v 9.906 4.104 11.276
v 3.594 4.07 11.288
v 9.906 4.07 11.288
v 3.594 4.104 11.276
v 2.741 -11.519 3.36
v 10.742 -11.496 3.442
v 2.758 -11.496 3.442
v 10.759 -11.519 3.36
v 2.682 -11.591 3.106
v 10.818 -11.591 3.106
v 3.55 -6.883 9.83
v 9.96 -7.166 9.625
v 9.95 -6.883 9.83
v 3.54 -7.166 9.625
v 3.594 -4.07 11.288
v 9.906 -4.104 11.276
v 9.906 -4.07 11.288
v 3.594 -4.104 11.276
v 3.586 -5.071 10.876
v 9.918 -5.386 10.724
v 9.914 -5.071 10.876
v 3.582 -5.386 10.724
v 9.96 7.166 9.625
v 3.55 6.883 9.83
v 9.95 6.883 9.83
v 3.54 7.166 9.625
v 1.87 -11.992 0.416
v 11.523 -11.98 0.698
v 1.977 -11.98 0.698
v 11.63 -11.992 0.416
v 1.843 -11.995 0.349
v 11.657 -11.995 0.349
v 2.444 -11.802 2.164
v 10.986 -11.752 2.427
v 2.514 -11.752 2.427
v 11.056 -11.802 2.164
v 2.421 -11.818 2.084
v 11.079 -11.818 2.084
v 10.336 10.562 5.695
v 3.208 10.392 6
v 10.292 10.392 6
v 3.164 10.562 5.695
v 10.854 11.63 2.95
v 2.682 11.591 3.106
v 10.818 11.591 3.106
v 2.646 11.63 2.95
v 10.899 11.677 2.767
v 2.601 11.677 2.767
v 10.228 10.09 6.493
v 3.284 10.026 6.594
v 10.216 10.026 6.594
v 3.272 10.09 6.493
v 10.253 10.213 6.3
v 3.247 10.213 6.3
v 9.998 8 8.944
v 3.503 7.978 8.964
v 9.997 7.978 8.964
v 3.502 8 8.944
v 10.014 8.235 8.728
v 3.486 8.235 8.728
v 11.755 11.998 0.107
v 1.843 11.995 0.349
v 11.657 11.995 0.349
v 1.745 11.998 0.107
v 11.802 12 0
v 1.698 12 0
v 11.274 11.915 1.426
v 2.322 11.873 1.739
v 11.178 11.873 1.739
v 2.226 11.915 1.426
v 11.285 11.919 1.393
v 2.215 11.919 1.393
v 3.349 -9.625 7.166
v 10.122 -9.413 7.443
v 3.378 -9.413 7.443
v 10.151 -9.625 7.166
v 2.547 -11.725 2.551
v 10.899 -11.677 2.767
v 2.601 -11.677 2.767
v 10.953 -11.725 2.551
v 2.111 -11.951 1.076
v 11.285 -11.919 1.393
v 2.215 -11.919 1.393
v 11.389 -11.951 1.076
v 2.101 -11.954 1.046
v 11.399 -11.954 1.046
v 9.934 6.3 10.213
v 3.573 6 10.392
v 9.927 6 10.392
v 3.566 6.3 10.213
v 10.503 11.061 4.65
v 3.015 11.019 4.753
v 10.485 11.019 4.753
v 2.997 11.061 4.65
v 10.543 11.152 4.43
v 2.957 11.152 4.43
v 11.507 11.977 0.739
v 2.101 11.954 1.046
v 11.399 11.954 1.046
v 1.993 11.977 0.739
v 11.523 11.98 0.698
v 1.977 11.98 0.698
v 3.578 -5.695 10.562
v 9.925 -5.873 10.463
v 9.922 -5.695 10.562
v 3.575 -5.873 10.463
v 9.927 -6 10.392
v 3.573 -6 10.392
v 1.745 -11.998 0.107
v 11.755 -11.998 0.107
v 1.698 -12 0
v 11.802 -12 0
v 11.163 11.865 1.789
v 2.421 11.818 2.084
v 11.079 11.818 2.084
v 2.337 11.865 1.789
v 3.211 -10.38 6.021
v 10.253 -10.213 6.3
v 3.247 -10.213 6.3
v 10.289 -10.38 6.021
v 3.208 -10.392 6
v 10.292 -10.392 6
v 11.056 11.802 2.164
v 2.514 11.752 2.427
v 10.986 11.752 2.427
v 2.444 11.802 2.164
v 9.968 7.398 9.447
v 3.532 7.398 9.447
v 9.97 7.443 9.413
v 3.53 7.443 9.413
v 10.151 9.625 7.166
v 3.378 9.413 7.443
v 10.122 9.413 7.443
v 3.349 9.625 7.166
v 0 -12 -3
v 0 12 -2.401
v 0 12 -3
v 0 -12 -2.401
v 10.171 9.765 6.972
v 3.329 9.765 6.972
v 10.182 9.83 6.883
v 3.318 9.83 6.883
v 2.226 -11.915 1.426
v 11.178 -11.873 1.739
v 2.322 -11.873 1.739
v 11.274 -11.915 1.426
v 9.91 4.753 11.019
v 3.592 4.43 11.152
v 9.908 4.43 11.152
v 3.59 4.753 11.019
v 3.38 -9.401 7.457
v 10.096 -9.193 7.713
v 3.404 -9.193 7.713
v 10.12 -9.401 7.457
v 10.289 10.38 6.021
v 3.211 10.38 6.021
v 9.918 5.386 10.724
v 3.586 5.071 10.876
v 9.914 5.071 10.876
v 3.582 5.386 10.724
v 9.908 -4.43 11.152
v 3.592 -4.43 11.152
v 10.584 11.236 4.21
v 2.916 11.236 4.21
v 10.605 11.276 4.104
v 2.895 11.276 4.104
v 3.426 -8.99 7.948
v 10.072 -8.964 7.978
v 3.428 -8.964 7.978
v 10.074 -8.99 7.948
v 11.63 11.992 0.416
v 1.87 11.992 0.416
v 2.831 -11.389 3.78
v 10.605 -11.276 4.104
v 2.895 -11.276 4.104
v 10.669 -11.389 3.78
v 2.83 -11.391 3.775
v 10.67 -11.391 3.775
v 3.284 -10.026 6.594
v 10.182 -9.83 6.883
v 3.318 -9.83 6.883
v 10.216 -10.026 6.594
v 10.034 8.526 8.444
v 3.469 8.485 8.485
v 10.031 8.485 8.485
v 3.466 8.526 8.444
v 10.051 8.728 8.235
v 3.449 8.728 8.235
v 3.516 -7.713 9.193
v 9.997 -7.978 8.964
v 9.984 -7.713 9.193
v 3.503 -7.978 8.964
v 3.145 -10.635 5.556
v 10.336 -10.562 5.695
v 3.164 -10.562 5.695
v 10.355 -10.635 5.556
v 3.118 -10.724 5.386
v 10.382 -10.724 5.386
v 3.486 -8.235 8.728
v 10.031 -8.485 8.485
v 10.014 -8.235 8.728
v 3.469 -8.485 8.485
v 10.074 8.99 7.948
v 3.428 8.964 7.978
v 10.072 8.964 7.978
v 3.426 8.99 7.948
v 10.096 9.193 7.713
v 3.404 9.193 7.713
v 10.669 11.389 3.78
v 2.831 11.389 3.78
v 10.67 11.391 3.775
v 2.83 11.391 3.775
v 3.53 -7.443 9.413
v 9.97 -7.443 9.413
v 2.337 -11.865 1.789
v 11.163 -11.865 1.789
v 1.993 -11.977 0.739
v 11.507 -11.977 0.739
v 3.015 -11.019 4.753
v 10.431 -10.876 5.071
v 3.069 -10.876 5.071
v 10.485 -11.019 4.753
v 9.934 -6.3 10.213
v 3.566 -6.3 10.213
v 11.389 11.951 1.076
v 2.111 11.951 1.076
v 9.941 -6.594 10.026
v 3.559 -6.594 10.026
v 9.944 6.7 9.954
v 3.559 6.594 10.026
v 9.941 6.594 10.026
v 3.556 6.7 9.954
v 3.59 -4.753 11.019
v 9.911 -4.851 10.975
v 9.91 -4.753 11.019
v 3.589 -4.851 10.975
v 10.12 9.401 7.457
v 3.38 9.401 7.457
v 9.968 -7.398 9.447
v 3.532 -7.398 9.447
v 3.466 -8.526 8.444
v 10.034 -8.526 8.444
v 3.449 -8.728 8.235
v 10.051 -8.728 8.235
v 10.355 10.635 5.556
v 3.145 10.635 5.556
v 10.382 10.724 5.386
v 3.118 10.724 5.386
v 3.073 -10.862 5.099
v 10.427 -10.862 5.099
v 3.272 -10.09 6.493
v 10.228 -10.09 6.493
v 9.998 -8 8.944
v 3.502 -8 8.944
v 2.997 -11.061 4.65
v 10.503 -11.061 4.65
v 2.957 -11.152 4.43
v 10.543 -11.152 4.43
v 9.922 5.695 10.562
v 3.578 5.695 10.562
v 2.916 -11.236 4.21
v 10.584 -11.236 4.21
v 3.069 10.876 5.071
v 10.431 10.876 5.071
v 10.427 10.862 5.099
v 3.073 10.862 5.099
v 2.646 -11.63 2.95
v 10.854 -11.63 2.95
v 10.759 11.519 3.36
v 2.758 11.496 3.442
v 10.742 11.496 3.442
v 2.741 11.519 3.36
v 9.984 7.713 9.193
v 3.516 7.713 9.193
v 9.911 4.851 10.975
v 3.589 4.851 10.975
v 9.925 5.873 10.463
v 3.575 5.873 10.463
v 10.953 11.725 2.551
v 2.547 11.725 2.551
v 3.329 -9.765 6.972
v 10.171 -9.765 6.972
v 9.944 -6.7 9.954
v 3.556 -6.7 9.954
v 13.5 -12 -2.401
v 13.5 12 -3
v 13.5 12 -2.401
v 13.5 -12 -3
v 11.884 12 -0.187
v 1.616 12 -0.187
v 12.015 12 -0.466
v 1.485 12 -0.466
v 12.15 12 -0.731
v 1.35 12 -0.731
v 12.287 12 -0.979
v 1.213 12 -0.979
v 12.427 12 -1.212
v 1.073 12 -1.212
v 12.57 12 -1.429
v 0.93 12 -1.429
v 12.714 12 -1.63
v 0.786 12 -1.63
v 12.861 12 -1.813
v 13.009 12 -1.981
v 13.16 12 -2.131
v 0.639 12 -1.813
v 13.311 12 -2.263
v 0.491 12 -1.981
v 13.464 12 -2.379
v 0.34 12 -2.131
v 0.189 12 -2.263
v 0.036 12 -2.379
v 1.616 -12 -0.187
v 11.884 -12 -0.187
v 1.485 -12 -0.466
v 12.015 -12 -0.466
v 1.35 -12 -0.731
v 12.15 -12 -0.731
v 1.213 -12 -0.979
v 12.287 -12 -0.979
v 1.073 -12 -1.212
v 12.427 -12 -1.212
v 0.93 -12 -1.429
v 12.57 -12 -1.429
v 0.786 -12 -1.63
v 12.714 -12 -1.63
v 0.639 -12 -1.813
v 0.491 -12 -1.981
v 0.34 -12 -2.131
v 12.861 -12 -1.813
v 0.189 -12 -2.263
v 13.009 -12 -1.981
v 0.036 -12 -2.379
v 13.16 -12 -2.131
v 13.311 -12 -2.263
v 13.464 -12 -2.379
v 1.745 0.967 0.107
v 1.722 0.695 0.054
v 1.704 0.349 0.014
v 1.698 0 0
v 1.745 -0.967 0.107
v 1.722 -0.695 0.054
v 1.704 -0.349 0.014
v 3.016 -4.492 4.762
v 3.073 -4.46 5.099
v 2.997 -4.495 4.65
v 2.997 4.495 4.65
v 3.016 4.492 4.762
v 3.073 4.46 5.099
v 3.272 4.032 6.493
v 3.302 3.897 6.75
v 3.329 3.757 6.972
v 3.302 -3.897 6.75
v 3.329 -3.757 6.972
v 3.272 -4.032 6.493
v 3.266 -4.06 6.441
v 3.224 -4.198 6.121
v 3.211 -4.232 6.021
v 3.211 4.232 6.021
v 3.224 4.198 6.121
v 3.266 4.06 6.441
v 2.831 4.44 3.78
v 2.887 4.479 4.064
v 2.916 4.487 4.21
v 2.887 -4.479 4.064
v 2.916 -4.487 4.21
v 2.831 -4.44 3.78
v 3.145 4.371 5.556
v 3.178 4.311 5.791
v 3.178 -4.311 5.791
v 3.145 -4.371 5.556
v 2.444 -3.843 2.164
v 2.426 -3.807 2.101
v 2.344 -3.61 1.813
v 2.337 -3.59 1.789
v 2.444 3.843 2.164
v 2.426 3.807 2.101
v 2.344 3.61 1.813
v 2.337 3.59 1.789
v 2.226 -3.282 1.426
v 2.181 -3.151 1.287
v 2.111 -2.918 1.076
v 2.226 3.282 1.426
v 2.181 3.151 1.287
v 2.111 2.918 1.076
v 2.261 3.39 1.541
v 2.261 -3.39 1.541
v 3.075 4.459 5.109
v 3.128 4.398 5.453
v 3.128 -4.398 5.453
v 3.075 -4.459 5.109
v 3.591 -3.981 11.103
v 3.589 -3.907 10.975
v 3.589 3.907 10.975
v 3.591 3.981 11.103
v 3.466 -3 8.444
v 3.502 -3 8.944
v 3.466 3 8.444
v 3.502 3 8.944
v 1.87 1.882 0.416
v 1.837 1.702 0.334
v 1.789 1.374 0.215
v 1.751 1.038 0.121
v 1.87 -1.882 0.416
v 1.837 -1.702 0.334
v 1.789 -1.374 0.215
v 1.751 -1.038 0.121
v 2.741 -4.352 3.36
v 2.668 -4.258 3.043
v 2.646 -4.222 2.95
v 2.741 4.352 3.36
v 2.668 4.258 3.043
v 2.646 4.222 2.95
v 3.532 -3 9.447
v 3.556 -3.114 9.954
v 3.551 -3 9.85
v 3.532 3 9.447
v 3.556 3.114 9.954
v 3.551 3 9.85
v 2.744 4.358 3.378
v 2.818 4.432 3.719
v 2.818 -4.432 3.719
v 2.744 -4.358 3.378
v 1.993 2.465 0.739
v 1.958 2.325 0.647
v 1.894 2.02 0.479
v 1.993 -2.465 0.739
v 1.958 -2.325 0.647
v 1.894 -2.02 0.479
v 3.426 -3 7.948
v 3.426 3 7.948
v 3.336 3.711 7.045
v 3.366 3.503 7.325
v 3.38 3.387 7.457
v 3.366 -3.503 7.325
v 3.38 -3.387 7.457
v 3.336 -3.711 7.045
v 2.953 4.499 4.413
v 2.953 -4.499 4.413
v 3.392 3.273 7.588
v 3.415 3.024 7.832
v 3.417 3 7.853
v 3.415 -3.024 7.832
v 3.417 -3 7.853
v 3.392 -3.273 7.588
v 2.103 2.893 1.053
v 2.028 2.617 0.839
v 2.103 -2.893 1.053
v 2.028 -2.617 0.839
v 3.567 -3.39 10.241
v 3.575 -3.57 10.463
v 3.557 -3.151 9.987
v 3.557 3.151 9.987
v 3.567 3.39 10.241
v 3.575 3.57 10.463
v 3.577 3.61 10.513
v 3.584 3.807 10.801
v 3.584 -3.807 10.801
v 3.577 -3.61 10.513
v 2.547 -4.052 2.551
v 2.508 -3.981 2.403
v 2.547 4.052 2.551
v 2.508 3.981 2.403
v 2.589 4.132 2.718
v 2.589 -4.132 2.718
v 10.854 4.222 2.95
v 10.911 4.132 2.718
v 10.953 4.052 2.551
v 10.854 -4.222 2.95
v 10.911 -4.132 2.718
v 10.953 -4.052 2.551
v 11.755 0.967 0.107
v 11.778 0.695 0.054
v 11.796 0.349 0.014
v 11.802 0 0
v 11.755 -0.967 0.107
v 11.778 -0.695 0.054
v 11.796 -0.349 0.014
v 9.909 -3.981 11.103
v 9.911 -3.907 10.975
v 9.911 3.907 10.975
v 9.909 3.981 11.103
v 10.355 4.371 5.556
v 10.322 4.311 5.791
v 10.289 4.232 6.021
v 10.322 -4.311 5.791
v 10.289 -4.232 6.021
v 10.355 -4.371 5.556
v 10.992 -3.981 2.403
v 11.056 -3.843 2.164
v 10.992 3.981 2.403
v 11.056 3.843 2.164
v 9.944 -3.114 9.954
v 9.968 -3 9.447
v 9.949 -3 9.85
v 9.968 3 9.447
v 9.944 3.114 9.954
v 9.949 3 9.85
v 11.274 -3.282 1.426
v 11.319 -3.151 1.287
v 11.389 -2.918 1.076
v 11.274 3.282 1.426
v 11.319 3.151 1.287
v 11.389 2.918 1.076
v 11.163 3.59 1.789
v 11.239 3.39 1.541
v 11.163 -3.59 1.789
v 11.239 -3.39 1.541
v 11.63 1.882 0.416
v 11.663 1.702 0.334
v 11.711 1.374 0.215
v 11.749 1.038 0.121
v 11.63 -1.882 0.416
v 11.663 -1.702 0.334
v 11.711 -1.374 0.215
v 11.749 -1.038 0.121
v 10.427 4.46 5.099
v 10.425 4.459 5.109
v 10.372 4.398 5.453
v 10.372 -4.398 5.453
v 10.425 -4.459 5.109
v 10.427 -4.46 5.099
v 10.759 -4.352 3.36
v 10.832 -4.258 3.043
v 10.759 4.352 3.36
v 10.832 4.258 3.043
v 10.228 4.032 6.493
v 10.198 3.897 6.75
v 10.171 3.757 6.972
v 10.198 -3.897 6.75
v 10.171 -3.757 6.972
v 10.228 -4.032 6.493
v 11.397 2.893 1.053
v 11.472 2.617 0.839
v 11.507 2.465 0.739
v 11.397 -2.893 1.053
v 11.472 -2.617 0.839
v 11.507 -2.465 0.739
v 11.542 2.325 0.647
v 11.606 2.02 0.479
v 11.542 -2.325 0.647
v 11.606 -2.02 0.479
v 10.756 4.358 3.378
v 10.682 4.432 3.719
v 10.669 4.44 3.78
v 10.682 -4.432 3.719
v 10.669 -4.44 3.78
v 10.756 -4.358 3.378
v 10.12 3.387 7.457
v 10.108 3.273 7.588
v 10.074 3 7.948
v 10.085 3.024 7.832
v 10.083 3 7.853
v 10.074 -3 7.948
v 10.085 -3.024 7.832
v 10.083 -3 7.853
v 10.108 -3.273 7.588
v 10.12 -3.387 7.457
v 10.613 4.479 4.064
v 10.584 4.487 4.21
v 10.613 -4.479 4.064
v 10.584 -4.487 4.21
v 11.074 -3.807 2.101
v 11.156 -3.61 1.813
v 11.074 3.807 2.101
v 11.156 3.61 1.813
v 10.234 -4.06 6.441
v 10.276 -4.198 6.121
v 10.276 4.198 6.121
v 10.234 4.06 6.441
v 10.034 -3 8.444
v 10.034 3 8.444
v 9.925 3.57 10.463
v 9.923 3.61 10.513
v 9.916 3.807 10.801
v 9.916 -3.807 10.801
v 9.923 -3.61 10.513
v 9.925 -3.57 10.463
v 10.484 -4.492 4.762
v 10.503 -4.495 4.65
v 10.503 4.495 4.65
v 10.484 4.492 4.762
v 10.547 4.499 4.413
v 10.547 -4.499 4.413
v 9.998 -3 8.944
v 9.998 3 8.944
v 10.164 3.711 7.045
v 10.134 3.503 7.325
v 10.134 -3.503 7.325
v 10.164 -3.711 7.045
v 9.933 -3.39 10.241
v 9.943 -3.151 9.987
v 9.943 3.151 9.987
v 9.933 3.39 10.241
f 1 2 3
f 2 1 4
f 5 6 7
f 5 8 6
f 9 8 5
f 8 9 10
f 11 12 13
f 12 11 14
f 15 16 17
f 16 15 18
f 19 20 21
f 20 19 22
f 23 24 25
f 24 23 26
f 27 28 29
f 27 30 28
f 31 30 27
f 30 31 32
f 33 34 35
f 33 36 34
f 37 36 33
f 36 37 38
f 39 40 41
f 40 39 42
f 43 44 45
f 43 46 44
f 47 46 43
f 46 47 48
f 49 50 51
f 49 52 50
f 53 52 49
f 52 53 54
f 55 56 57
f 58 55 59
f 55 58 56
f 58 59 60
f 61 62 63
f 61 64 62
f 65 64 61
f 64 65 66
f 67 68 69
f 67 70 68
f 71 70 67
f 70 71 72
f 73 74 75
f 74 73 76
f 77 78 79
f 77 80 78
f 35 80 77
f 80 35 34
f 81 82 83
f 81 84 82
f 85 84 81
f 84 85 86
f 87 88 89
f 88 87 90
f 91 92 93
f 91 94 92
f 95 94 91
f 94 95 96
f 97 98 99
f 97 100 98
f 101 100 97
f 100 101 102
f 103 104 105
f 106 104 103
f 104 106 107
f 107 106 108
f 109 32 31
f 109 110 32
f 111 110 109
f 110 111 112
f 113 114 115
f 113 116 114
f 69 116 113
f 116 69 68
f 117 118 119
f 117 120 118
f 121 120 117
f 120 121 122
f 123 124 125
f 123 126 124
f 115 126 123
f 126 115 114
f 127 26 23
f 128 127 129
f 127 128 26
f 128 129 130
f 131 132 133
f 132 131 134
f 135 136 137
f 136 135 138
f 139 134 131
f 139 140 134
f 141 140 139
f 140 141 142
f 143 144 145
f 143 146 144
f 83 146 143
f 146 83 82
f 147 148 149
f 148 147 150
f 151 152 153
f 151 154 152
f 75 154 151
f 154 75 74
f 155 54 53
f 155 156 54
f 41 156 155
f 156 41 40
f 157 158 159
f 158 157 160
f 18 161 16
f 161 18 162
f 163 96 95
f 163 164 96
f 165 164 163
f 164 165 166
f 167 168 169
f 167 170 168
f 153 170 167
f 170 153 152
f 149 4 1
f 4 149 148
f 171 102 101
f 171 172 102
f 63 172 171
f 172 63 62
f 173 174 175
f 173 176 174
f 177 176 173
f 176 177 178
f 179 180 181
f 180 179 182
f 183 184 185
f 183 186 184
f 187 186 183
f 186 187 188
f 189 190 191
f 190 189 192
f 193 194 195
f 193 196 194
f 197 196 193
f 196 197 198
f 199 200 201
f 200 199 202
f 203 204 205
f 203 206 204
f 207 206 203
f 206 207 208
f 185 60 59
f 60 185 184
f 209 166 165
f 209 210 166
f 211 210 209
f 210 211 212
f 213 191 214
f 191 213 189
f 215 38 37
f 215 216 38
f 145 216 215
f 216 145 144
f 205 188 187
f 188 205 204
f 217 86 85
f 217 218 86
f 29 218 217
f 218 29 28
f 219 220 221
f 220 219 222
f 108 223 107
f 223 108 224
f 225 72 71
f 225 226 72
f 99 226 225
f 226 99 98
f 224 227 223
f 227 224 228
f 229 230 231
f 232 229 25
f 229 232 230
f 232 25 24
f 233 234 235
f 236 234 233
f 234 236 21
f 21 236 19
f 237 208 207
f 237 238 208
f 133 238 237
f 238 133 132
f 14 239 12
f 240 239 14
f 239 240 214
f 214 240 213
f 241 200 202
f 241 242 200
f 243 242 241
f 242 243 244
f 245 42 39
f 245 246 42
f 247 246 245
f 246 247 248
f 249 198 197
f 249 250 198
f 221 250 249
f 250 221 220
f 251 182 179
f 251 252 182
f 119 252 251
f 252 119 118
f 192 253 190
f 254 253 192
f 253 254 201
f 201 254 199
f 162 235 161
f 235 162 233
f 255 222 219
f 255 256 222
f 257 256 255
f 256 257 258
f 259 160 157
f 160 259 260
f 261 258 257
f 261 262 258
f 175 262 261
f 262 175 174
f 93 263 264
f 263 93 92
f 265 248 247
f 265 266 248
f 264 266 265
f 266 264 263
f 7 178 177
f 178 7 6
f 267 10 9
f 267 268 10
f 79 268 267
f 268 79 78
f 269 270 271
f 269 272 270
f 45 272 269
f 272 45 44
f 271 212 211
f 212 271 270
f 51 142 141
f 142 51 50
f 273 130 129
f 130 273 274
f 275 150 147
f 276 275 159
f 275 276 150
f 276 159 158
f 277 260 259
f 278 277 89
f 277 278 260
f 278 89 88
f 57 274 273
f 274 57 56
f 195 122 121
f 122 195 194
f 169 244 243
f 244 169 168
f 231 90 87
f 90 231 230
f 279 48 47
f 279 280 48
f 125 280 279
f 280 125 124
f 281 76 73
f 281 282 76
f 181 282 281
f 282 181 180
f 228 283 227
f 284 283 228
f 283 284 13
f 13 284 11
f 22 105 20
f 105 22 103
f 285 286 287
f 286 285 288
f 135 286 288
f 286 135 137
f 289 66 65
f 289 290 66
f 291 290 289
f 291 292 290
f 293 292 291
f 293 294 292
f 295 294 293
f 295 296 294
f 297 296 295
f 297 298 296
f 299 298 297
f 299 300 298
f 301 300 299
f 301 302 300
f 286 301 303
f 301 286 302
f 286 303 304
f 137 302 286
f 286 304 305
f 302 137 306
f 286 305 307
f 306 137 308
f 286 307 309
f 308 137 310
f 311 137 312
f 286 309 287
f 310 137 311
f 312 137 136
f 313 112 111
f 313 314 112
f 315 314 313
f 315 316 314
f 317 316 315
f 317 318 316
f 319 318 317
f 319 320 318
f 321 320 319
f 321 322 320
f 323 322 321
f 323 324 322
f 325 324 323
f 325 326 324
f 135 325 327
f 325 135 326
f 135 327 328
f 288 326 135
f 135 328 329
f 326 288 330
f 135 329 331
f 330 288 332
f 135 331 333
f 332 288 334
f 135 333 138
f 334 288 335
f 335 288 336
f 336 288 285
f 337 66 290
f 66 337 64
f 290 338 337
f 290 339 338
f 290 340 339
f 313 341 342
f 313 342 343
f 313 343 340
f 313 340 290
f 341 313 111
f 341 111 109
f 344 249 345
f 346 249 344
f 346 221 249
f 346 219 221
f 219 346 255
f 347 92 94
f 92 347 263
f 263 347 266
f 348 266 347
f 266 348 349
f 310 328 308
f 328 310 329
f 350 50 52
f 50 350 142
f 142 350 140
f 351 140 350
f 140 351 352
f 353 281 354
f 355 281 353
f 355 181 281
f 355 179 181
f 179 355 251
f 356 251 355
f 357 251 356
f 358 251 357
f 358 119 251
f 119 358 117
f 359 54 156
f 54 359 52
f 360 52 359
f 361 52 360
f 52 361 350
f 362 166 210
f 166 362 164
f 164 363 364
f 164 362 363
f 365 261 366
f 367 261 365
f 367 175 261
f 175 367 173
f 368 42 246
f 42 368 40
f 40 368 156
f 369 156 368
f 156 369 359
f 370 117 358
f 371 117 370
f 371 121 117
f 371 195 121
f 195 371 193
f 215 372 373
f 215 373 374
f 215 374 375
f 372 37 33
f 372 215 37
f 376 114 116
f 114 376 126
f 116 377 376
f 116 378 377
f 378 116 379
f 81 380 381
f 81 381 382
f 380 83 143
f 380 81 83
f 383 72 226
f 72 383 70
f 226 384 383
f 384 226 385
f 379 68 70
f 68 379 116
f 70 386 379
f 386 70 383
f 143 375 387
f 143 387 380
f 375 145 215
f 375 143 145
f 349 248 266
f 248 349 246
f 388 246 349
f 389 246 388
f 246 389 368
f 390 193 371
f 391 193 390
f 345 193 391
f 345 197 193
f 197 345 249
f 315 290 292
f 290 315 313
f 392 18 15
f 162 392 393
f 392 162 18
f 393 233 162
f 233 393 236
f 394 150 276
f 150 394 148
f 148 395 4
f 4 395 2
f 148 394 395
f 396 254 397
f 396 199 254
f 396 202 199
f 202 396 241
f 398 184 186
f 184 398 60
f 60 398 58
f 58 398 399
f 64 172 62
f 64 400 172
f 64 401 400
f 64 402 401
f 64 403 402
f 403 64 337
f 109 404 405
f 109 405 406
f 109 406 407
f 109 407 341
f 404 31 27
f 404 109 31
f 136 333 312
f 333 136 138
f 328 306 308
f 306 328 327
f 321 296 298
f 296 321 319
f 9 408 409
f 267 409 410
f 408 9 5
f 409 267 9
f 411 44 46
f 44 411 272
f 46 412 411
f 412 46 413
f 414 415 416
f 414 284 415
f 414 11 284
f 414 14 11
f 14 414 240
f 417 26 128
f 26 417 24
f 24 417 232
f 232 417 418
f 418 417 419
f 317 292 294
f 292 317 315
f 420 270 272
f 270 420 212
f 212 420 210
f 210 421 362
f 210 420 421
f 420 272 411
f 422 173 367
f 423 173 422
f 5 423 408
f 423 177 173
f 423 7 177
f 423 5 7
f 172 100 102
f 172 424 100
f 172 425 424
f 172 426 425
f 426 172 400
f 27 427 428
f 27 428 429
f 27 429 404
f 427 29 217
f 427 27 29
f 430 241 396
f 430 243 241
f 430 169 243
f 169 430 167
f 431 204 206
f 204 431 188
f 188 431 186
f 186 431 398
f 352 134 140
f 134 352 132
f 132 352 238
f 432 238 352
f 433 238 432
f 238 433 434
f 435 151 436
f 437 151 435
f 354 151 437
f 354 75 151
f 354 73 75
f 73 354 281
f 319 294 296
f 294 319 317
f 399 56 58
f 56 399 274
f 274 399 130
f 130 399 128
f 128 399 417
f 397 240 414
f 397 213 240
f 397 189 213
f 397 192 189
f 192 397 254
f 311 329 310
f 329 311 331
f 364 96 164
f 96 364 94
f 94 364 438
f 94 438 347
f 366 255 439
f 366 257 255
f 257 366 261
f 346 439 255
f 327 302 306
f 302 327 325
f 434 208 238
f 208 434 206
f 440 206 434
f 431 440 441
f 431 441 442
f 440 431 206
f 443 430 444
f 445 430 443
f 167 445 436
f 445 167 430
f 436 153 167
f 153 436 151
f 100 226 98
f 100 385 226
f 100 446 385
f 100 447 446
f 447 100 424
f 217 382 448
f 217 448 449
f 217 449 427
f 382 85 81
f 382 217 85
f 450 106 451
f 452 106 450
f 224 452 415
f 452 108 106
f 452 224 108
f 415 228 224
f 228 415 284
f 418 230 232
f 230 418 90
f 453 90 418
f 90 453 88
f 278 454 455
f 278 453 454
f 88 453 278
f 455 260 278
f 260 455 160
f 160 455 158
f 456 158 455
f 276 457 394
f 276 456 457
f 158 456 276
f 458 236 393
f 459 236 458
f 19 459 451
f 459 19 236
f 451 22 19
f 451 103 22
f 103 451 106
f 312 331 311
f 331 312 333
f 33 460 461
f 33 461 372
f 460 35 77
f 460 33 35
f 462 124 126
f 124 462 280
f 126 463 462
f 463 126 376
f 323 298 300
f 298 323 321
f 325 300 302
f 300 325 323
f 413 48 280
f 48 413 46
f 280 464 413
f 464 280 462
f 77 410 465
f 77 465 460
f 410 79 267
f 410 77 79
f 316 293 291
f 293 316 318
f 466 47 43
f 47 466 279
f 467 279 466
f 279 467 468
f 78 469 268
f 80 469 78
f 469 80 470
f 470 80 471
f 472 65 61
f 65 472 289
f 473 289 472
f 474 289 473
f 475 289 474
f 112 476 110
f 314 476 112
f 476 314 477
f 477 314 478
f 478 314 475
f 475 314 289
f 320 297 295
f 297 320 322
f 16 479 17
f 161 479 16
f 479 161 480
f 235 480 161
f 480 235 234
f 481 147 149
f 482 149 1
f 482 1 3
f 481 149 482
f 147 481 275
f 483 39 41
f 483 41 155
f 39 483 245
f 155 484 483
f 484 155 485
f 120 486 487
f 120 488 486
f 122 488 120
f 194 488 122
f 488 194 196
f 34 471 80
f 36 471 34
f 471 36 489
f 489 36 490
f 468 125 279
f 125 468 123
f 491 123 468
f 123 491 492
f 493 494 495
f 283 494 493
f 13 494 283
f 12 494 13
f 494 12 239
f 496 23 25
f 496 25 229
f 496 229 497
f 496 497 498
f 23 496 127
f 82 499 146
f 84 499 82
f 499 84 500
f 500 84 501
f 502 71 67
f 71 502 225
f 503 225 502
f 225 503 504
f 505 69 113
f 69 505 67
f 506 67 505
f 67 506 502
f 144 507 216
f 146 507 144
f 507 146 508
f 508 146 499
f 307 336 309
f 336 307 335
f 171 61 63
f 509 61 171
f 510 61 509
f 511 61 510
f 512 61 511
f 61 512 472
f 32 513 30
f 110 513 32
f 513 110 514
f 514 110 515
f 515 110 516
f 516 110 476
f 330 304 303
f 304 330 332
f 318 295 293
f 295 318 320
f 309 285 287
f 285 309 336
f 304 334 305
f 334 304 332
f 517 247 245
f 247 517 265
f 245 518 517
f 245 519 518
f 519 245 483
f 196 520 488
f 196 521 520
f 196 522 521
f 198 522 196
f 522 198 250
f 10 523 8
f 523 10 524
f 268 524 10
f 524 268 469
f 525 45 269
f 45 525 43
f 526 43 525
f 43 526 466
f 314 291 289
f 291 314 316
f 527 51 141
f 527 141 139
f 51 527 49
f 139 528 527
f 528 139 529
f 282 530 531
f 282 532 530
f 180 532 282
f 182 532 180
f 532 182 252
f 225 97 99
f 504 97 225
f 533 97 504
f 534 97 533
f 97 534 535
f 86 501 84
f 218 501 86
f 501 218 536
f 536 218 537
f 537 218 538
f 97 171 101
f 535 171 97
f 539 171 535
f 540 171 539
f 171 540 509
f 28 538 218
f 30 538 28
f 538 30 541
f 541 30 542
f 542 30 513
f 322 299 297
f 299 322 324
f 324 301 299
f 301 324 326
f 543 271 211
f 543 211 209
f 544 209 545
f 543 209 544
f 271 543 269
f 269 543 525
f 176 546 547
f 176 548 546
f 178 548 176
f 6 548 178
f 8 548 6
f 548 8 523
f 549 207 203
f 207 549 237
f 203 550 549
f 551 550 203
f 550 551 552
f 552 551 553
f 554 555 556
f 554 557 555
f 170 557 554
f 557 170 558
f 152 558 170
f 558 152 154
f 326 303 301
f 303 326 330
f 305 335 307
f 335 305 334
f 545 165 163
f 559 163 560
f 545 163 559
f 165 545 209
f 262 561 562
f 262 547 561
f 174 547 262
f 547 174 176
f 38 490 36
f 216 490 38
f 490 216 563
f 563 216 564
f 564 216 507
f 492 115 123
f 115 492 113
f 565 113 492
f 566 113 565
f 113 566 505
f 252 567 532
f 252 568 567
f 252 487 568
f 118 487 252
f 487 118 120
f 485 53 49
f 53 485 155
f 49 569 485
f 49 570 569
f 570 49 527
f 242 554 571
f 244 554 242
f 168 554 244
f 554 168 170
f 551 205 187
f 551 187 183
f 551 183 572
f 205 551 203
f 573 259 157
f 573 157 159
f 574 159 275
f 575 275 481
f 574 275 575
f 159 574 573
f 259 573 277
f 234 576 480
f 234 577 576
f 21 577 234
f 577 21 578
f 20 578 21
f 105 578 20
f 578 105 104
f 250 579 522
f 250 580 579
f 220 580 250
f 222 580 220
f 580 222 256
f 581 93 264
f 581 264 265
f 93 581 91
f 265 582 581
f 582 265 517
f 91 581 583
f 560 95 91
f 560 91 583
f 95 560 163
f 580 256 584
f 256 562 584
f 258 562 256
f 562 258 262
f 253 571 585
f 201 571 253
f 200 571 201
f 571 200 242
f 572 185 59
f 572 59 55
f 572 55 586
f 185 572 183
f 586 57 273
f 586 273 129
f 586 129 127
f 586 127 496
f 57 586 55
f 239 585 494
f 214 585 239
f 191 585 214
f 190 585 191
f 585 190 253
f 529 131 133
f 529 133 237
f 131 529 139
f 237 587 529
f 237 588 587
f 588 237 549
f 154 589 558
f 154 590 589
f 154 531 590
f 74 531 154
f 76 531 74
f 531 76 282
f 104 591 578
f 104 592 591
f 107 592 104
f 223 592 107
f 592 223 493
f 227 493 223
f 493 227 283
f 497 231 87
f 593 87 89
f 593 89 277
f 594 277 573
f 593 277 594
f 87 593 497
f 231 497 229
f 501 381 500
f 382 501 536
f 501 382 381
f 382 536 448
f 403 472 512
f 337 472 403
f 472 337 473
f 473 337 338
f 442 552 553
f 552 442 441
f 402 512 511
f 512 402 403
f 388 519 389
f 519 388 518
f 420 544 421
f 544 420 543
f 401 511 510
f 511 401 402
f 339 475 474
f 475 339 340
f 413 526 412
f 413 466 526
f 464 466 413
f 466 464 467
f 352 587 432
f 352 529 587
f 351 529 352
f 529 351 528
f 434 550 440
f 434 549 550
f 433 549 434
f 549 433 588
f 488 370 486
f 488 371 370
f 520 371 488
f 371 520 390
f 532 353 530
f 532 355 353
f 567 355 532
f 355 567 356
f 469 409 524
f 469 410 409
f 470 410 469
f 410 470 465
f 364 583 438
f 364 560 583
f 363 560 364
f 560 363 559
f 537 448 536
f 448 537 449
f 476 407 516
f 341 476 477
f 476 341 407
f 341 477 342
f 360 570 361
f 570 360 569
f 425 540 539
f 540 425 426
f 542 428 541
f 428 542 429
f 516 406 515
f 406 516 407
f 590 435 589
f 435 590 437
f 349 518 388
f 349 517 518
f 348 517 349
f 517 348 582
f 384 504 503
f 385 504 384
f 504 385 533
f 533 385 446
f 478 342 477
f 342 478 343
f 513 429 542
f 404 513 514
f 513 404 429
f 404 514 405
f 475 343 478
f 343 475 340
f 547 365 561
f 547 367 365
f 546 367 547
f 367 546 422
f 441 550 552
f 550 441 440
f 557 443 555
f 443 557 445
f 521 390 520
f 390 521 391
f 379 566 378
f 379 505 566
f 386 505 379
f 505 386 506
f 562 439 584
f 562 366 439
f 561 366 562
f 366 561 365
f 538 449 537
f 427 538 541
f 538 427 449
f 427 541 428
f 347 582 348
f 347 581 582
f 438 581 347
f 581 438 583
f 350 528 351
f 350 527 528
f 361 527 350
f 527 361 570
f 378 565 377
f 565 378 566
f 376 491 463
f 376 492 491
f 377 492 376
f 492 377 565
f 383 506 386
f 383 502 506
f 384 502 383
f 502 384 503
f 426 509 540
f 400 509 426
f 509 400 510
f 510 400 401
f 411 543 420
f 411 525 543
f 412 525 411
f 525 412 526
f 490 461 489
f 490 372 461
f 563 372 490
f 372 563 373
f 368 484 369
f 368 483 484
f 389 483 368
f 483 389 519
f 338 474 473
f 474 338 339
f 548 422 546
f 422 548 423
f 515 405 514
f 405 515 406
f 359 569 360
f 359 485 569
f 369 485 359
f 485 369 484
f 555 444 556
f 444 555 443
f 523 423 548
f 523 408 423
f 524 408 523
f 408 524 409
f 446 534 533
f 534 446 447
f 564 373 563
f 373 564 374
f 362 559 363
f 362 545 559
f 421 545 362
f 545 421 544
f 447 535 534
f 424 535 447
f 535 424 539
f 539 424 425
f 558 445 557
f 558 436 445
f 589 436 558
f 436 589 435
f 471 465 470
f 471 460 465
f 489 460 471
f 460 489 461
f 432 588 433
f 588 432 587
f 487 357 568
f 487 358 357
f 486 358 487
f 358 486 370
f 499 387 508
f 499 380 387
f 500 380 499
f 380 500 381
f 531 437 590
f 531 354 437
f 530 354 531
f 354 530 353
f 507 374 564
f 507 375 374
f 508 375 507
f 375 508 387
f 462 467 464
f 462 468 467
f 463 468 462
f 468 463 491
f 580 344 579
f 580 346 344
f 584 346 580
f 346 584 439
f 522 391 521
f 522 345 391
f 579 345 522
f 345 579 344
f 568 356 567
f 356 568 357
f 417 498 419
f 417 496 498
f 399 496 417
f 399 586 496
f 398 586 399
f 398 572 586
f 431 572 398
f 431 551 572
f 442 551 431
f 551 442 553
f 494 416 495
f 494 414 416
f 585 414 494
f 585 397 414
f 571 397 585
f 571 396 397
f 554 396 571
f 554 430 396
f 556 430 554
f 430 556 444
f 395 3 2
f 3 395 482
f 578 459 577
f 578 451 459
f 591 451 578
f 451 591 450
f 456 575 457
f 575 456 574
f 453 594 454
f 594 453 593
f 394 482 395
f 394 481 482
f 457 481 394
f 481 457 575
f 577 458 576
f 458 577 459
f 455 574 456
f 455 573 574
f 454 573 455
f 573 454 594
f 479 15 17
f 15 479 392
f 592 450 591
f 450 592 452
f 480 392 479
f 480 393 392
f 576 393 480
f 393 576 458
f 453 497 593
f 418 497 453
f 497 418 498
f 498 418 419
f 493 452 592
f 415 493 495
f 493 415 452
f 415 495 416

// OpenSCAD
// it would be nice to bevel the deges, but we'll rely
// on build direction and skeinforge to do that for us
$fs=0.35;
$fa=1;

tol = 0.01;

basew = 25/2+1;  // wide enough for 1/2" double sided sticky tape with some slop

// ethernet
hole = 9;
gap = 6;

// power cable or video?
// hole = 12;
// gap = 7;

wall = 3;
basel = (hole + wall)*2;

sidecurveoff = wall*0.3;
sidecurvez = wall*0.9;
sidecurveh = basel/2+sidecurvez;
sidecurvew = basew/3;

difference() {
 union(){
  // base
  translate([0 , -basel/2, -wall])  cube([ basew, basel, wall ]);
  // body
  intersection() {
    rotate([0,90,0])
       cylinder(h=basew+tol*2, r=basel/2);
    translate([0,-basel/2, 0])
      cube([ basew, basel, basel/2]);
  }
 }
  // hole
  translate([-tol, 0, hole/2])
     rotate([0,90,0])
        cylinder(h=basew+tol*2, r=hole/2);
  // gap
  translate([-tol , -gap/2, hole/2-tol]) 
    cube([tol*2+basew, gap, tol*2+wall+hole/2]);
  // take a nick out of the top of the gap
  translate([-tol, 0, wall*1.4+hole])
    rotate([0,90,0])
       cylinder(h=basew+tol*2, r=gap/2+wall/2);
  // take some material off of the sides too
  translate([0,-basel/2-tol,sidecurveh-sidecurvez]) rotate([0,90,90]){   
    translate([0,sidecurveoff,0])
      scale([sidecurveh/10,sidecurvew/10,1])cylinder(h=basel+tol*2,r=10);
    translate([0,-basew-sidecurveoff,0])
      scale([sidecurveh/10,sidecurvew/10,1])cylinder(h=basel+tol*2, r=10);

  }
}
